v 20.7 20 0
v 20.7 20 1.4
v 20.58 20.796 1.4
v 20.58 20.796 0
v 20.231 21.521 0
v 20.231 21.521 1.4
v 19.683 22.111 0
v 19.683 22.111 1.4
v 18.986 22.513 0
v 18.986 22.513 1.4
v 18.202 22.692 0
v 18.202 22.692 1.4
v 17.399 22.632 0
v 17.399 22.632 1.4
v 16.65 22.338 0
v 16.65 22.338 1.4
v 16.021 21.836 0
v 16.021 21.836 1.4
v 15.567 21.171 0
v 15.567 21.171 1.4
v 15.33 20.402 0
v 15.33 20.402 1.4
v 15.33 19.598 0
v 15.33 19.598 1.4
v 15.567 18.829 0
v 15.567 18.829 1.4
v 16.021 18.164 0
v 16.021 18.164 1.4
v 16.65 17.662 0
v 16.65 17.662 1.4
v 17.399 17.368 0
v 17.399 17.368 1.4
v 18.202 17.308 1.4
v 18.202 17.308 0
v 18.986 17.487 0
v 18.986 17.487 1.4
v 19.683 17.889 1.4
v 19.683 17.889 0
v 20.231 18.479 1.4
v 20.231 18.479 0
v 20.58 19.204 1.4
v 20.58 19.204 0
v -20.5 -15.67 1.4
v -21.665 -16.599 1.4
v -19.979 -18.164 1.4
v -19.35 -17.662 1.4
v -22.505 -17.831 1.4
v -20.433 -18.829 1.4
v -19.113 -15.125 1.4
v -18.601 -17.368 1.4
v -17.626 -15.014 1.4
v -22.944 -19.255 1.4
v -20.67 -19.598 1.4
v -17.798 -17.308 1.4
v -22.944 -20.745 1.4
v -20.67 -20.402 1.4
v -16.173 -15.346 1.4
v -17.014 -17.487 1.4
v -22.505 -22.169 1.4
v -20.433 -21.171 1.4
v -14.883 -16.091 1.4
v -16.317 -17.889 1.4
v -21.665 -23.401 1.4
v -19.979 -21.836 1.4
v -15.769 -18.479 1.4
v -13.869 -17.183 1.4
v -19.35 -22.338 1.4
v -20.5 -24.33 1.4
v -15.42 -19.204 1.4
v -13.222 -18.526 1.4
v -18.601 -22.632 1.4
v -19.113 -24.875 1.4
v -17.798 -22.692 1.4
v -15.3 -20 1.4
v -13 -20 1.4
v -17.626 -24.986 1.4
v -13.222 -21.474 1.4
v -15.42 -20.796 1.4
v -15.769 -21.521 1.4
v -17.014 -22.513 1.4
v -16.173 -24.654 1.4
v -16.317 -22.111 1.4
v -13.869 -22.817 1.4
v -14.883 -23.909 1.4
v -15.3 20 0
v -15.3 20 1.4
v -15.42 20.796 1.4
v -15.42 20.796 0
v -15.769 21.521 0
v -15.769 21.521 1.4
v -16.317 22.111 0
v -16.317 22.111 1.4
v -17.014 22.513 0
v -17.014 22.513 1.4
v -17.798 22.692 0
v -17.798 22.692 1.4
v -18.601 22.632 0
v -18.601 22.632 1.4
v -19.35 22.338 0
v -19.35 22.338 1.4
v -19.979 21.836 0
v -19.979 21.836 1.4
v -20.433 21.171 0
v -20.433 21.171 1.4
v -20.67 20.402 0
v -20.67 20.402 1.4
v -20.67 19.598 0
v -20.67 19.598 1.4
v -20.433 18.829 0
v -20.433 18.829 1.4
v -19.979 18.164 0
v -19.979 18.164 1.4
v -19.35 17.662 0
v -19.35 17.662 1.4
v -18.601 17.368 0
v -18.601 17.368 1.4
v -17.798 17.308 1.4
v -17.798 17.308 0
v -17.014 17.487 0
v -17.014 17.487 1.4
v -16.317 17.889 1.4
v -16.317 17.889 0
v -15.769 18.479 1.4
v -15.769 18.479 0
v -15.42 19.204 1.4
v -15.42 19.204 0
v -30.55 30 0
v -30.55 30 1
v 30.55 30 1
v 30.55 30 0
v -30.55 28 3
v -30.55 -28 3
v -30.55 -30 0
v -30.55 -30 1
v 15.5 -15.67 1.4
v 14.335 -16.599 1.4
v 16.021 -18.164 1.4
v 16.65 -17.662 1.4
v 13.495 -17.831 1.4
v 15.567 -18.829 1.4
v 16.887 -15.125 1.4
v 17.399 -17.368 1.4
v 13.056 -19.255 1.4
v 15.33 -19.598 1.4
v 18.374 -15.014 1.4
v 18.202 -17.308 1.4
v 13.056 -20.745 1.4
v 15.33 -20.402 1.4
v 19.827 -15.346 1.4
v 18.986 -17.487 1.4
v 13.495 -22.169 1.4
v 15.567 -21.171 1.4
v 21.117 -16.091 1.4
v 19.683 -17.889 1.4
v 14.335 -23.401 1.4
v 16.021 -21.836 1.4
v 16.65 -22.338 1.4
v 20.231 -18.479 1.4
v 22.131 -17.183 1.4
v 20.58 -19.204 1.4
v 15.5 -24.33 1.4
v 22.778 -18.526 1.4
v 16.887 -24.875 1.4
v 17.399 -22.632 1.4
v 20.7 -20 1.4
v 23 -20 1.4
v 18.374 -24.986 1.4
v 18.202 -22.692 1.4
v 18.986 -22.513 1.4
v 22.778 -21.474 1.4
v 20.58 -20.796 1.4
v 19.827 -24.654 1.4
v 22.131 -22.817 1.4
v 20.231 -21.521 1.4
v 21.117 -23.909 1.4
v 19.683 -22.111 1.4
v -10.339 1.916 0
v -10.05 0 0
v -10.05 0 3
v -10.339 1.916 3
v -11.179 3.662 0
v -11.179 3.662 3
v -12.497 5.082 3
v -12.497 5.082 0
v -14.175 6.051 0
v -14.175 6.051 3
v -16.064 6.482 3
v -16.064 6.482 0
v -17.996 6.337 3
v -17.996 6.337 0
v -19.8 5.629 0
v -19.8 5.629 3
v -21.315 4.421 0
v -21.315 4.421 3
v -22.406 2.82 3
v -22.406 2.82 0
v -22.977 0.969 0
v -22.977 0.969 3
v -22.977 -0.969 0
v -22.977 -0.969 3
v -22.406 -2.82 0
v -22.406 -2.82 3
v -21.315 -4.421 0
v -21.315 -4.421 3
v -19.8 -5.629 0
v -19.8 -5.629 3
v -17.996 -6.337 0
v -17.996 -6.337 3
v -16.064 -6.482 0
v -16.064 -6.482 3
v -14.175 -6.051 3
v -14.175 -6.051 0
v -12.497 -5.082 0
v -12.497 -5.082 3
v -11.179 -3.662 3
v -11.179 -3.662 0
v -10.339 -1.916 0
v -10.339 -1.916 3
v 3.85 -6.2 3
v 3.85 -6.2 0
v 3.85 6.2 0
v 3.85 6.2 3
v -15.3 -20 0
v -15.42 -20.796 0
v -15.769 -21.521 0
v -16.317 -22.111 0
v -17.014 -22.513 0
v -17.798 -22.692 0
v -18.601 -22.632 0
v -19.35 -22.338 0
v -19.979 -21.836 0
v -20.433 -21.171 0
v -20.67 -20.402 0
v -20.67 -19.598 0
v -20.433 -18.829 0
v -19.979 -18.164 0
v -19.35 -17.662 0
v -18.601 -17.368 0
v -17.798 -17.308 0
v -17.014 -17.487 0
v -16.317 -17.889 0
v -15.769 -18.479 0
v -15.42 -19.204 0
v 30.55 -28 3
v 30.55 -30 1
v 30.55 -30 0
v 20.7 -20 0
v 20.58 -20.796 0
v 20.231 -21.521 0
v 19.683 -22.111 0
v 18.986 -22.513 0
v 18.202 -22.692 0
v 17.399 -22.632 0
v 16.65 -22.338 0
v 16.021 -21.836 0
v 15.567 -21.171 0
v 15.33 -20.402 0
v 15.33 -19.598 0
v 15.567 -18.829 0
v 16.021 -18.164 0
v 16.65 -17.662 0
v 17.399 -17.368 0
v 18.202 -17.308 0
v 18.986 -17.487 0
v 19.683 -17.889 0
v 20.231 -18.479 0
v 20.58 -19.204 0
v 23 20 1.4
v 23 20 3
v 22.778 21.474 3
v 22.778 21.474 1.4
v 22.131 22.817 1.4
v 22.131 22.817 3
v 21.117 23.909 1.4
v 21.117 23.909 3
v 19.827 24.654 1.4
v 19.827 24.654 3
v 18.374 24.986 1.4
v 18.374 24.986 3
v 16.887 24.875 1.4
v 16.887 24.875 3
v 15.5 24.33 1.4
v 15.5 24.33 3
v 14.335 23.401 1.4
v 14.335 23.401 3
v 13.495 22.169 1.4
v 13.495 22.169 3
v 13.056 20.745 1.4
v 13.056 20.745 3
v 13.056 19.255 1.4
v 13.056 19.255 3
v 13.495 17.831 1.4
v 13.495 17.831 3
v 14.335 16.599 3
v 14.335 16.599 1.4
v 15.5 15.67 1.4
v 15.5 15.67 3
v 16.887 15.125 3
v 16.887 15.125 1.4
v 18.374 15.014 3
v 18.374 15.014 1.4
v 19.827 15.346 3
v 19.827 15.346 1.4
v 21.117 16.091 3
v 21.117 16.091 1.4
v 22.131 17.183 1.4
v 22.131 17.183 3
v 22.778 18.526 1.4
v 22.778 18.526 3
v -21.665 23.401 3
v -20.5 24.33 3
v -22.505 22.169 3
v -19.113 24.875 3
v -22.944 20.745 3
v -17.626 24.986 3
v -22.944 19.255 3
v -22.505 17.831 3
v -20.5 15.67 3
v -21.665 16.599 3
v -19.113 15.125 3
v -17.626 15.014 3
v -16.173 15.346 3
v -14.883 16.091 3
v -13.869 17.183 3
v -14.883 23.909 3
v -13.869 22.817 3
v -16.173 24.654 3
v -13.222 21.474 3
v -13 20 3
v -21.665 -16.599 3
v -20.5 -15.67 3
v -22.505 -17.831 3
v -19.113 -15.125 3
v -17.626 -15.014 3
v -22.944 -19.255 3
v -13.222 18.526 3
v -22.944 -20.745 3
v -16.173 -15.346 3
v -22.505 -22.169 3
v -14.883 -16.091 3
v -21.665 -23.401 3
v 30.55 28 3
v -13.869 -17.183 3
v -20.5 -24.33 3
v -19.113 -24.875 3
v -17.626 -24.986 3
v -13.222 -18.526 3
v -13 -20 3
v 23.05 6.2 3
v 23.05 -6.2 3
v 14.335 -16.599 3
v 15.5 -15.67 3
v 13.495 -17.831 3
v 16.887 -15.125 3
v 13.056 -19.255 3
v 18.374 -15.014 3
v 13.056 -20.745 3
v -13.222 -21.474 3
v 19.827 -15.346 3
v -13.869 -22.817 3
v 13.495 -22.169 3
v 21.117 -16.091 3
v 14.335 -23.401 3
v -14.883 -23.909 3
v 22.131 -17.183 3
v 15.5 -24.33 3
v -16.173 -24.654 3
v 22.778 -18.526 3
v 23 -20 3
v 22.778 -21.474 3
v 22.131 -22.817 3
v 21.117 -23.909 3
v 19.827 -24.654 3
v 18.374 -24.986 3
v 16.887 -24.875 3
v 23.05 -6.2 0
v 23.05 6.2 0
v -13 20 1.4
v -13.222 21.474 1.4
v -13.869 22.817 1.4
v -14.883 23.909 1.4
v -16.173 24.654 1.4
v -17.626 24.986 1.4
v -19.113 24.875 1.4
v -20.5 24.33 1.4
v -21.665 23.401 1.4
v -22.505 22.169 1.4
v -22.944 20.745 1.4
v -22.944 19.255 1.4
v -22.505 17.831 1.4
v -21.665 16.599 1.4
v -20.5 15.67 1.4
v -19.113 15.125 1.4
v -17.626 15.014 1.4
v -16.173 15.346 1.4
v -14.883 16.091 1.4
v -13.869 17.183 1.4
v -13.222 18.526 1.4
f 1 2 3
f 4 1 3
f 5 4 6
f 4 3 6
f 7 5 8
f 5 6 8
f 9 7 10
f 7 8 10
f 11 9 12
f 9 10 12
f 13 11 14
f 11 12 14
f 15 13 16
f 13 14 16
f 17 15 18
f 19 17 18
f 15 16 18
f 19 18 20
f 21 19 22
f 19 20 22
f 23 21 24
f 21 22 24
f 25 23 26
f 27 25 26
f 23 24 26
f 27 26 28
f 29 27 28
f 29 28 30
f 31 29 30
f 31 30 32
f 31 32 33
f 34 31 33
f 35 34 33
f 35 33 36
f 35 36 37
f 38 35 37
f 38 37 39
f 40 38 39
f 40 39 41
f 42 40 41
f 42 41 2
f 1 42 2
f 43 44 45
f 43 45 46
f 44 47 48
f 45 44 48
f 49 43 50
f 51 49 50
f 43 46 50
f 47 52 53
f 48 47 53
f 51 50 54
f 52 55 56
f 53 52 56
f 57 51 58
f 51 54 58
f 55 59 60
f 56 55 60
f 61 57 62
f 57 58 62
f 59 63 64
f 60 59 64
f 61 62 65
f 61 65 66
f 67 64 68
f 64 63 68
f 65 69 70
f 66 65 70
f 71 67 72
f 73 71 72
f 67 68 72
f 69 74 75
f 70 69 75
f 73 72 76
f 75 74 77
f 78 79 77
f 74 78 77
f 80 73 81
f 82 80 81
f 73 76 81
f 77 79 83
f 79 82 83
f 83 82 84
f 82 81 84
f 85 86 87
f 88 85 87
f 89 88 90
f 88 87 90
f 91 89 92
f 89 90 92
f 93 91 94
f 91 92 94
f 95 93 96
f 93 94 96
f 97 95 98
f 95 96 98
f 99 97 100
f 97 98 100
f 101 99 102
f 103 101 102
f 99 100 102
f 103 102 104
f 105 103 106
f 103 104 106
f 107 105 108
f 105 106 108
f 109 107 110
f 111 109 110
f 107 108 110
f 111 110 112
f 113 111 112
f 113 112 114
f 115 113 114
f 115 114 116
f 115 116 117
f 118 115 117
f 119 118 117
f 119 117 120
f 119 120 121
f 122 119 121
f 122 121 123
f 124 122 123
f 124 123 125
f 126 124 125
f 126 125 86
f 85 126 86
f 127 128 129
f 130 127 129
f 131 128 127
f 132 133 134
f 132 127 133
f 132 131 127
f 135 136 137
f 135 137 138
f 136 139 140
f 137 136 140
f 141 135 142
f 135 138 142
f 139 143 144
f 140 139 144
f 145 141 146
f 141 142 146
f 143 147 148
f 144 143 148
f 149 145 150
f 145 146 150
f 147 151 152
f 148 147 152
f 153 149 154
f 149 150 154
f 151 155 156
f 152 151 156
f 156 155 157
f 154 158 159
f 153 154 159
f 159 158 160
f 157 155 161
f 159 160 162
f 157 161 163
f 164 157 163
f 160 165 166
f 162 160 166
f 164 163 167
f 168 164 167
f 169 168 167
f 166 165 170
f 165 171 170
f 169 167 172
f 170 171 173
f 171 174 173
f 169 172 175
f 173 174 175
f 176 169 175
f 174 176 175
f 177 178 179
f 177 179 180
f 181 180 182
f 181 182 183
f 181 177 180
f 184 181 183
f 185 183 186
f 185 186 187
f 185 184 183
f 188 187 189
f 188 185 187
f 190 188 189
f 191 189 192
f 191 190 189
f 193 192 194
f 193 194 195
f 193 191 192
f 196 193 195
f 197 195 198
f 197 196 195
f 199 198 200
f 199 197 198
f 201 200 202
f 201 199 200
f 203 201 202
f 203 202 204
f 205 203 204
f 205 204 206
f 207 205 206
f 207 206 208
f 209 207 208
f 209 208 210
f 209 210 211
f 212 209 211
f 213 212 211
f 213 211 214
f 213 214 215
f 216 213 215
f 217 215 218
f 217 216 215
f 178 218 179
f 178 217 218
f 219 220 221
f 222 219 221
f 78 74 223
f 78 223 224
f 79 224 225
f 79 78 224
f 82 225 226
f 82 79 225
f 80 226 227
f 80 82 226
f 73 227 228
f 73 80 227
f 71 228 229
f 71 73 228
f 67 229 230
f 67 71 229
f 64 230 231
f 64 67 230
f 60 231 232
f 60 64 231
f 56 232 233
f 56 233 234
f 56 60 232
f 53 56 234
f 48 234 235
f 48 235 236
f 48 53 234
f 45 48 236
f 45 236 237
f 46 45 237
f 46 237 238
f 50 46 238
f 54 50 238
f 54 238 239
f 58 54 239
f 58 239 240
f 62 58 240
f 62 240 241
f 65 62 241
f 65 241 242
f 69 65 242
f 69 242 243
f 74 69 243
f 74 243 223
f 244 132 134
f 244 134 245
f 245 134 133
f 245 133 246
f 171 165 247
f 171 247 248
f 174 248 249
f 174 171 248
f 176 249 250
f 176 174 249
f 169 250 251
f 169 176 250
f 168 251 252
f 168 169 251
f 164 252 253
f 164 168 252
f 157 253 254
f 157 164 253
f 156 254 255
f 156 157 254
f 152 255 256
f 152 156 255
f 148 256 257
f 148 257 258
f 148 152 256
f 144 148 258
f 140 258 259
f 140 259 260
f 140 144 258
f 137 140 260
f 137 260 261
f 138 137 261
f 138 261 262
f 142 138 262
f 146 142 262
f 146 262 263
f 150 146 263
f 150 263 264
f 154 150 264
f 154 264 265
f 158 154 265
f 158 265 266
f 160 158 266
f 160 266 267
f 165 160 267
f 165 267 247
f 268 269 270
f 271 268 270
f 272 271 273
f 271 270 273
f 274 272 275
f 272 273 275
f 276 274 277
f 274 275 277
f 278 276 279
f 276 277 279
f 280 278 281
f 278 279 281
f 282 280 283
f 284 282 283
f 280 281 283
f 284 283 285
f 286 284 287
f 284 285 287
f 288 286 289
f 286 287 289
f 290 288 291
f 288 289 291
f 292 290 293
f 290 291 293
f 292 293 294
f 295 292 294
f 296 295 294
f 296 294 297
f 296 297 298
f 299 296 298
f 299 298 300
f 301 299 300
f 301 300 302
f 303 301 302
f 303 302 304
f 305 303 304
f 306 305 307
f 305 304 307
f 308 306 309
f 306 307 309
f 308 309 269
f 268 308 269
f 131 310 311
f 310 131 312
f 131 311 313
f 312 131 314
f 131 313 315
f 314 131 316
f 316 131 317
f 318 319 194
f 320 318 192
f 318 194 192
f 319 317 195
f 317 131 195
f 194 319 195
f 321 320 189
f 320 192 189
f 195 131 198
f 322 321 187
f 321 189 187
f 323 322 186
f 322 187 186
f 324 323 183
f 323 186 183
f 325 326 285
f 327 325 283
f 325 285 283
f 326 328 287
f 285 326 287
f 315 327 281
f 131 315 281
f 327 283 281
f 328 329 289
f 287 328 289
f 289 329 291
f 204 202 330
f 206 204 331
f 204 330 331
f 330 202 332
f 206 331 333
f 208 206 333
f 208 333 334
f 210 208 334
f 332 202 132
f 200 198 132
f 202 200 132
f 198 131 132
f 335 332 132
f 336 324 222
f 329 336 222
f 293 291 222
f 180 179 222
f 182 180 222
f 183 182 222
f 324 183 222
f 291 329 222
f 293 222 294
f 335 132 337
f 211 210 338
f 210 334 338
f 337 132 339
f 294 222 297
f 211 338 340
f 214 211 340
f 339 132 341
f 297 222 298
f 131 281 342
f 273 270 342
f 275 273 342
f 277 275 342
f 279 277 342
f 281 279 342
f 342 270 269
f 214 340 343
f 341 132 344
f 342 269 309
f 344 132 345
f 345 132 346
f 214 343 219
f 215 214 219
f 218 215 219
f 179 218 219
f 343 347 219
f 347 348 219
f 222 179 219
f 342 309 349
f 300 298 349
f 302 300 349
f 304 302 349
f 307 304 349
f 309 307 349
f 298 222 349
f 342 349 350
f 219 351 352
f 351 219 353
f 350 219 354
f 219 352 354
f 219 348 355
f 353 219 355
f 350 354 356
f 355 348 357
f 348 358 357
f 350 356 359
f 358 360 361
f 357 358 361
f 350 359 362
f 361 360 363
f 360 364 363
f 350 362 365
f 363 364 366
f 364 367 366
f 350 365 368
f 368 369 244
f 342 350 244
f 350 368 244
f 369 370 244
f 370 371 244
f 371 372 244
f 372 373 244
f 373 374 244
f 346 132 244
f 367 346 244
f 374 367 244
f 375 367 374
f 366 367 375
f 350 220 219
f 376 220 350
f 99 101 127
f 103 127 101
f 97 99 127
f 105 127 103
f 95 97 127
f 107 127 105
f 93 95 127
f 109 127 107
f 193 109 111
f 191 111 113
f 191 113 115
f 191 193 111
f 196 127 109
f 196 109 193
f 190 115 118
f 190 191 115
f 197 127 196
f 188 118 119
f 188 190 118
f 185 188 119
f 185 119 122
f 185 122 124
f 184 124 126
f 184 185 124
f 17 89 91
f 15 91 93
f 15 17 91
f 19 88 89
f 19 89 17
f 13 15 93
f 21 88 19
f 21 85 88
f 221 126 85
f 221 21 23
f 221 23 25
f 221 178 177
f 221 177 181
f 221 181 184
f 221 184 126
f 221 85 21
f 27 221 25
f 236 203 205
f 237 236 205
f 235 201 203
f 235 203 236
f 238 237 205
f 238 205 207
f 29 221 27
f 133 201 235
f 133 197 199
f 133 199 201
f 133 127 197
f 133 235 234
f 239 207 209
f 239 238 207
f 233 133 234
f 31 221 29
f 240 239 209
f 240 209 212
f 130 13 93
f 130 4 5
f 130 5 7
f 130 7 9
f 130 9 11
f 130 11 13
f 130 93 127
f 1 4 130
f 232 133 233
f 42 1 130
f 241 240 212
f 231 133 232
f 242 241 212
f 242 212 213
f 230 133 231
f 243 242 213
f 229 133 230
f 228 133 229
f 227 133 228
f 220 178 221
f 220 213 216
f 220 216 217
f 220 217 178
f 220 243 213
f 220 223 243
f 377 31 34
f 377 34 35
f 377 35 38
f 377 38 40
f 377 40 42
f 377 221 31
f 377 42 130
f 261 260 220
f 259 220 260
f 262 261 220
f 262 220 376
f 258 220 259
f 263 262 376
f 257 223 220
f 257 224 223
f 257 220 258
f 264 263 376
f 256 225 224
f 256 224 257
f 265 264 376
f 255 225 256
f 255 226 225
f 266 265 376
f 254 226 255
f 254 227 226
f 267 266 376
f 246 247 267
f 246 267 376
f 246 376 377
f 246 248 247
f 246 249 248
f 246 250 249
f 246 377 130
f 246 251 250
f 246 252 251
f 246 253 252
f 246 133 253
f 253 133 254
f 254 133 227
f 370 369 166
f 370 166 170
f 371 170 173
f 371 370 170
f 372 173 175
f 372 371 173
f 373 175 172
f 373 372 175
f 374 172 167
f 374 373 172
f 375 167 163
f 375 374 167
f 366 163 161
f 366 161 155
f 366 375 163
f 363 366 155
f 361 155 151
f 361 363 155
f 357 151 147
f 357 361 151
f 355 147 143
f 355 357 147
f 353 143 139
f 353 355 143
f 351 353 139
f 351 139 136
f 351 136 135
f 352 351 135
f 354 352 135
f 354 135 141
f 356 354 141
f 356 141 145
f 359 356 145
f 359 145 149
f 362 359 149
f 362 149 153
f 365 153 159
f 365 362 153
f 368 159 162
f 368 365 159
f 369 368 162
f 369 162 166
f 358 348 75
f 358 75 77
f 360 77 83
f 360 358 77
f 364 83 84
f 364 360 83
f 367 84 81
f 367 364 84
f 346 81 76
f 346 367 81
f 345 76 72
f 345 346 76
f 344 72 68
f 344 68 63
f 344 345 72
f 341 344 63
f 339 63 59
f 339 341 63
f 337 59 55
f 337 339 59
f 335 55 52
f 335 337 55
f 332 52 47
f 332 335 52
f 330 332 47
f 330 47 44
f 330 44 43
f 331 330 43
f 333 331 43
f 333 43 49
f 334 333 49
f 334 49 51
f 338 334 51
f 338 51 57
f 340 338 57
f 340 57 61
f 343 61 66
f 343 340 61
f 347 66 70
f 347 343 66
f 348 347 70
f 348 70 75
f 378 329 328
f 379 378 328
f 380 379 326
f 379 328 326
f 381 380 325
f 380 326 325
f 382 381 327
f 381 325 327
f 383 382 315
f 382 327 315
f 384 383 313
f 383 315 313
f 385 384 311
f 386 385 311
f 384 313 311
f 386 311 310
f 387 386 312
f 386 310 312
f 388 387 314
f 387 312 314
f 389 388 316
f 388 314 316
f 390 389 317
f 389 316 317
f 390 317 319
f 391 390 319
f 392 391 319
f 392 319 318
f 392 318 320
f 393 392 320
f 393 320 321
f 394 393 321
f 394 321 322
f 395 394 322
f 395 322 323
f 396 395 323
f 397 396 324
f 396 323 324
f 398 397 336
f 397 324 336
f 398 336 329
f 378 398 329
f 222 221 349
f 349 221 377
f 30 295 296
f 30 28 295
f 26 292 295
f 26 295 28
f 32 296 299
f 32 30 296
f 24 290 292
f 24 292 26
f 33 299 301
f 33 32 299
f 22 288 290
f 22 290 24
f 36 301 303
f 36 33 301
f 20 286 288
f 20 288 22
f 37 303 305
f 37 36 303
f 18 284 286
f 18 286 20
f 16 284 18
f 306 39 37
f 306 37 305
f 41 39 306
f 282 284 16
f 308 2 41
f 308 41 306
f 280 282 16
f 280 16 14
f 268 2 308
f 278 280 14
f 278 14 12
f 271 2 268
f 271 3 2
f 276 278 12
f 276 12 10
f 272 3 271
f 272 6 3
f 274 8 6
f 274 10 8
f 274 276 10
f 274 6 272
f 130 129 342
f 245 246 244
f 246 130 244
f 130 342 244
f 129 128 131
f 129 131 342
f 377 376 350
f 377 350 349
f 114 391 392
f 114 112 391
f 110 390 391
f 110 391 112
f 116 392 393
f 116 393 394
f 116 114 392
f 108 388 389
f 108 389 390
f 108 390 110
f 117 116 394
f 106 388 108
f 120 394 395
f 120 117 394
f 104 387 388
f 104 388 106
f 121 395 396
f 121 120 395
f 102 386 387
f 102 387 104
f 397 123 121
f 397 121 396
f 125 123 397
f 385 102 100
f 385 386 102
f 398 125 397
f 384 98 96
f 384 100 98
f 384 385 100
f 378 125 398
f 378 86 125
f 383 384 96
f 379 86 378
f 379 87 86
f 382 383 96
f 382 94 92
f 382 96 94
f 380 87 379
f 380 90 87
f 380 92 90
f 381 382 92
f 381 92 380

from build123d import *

# Parameters (mm, degrees)
SCHIZZO1_W                   = 61.1
SCHIZZO1_H                   = 20
SCHIZZO1_R                   = 6.5
SCHIZZO1_W_2                 = 19.2
SCHIZZO1_H_2                 = 12.4
ESTRUSIONE_ESTRUSIONE1_DEPTH = 3
SCHIZZO5_W                   = 61.1
SCHIZZO5_H                   = 20
ESTRUSIONE_ESTRUSIONE2_DEPTH = 3
SCHIZZO6_R                   = 2.7
TAGLIO_ESTRUSIONE1_DEPTH     = 3
SCHIZZO7_R                   = 5
TAGLIO_ESTRUSIONE2_DEPTH     = 1.6
SMUSSO1_SIZE                 = 2


with BuildPart() as part:
    # Schizzo1 → Estrusione-Estrusione1 (new body)
    with BuildSketch(Plane.XY):
        Rectangle(SCHIZZO1_W, SCHIZZO1_H)
        with Locations((-16.55, 0)):
            Circle(SCHIZZO1_R, mode=Mode.SUBTRACT)
        with Locations((13.45, 0)):
            Rectangle(SCHIZZO1_W_2, SCHIZZO1_H_2, mode=Mode.SUBTRACT)
    extrude(amount=ESTRUSIONE_ESTRUSIONE1_DEPTH)

    # Schizzo5 → Estrusione-Estrusione2 (add)
    with BuildSketch(Plane.XY.offset(3)):
        with Locations((0, 20)):
            Rectangle(SCHIZZO5_W, SCHIZZO5_H)
    estrusione_estrusione2 = extrude(amount=-ESTRUSIONE_ESTRUSIONE2_DEPTH)

    # Schizzo6 → Taglio-Estrusione1 (cut)
    with BuildSketch(Plane.XY.offset(3)):
        with Locations((-18, 20)):
            Circle(SCHIZZO6_R)
        with Locations((18, 20)):
            Circle(SCHIZZO6_R)
    taglio_estrusione1 = extrude(amount=-TAGLIO_ESTRUSIONE1_DEPTH, mode=Mode.SUBTRACT)

    # Schizzo7 → Taglio-Estrusione2 (cut)
    with BuildSketch(Plane.XY.offset(3)):
        with Locations((-18, 20)):
            Circle(SCHIZZO7_R)
        with Locations((18, 20)):
            Circle(SCHIZZO7_R)
    taglio_estrusione2 = extrude(amount=-TAGLIO_ESTRUSIONE2_DEPTH, mode=Mode.SUBTRACT)

    # Specchia2: Estrusione-Estrusione2, Taglio-Estrusione1, Taglio-Estrusione2 across plane
    add(estrusione_estrusione2.mirror(Plane.ZX))
    add(taglio_estrusione1.mirror(Plane.ZX), mode=Mode.SUBTRACT)
    add(taglio_estrusione2.mirror(Plane.ZX), mode=Mode.SUBTRACT)

    # Smusso1
    smusso1_edges = [part.edges().sort_by_distance(p)[0] for p in [
        (0, 30, 3),
        (0, -30, 3),
    ]]
    chamfer(smusso1_edges, length=SMUSSO1_SIZE)


solid = part.part
